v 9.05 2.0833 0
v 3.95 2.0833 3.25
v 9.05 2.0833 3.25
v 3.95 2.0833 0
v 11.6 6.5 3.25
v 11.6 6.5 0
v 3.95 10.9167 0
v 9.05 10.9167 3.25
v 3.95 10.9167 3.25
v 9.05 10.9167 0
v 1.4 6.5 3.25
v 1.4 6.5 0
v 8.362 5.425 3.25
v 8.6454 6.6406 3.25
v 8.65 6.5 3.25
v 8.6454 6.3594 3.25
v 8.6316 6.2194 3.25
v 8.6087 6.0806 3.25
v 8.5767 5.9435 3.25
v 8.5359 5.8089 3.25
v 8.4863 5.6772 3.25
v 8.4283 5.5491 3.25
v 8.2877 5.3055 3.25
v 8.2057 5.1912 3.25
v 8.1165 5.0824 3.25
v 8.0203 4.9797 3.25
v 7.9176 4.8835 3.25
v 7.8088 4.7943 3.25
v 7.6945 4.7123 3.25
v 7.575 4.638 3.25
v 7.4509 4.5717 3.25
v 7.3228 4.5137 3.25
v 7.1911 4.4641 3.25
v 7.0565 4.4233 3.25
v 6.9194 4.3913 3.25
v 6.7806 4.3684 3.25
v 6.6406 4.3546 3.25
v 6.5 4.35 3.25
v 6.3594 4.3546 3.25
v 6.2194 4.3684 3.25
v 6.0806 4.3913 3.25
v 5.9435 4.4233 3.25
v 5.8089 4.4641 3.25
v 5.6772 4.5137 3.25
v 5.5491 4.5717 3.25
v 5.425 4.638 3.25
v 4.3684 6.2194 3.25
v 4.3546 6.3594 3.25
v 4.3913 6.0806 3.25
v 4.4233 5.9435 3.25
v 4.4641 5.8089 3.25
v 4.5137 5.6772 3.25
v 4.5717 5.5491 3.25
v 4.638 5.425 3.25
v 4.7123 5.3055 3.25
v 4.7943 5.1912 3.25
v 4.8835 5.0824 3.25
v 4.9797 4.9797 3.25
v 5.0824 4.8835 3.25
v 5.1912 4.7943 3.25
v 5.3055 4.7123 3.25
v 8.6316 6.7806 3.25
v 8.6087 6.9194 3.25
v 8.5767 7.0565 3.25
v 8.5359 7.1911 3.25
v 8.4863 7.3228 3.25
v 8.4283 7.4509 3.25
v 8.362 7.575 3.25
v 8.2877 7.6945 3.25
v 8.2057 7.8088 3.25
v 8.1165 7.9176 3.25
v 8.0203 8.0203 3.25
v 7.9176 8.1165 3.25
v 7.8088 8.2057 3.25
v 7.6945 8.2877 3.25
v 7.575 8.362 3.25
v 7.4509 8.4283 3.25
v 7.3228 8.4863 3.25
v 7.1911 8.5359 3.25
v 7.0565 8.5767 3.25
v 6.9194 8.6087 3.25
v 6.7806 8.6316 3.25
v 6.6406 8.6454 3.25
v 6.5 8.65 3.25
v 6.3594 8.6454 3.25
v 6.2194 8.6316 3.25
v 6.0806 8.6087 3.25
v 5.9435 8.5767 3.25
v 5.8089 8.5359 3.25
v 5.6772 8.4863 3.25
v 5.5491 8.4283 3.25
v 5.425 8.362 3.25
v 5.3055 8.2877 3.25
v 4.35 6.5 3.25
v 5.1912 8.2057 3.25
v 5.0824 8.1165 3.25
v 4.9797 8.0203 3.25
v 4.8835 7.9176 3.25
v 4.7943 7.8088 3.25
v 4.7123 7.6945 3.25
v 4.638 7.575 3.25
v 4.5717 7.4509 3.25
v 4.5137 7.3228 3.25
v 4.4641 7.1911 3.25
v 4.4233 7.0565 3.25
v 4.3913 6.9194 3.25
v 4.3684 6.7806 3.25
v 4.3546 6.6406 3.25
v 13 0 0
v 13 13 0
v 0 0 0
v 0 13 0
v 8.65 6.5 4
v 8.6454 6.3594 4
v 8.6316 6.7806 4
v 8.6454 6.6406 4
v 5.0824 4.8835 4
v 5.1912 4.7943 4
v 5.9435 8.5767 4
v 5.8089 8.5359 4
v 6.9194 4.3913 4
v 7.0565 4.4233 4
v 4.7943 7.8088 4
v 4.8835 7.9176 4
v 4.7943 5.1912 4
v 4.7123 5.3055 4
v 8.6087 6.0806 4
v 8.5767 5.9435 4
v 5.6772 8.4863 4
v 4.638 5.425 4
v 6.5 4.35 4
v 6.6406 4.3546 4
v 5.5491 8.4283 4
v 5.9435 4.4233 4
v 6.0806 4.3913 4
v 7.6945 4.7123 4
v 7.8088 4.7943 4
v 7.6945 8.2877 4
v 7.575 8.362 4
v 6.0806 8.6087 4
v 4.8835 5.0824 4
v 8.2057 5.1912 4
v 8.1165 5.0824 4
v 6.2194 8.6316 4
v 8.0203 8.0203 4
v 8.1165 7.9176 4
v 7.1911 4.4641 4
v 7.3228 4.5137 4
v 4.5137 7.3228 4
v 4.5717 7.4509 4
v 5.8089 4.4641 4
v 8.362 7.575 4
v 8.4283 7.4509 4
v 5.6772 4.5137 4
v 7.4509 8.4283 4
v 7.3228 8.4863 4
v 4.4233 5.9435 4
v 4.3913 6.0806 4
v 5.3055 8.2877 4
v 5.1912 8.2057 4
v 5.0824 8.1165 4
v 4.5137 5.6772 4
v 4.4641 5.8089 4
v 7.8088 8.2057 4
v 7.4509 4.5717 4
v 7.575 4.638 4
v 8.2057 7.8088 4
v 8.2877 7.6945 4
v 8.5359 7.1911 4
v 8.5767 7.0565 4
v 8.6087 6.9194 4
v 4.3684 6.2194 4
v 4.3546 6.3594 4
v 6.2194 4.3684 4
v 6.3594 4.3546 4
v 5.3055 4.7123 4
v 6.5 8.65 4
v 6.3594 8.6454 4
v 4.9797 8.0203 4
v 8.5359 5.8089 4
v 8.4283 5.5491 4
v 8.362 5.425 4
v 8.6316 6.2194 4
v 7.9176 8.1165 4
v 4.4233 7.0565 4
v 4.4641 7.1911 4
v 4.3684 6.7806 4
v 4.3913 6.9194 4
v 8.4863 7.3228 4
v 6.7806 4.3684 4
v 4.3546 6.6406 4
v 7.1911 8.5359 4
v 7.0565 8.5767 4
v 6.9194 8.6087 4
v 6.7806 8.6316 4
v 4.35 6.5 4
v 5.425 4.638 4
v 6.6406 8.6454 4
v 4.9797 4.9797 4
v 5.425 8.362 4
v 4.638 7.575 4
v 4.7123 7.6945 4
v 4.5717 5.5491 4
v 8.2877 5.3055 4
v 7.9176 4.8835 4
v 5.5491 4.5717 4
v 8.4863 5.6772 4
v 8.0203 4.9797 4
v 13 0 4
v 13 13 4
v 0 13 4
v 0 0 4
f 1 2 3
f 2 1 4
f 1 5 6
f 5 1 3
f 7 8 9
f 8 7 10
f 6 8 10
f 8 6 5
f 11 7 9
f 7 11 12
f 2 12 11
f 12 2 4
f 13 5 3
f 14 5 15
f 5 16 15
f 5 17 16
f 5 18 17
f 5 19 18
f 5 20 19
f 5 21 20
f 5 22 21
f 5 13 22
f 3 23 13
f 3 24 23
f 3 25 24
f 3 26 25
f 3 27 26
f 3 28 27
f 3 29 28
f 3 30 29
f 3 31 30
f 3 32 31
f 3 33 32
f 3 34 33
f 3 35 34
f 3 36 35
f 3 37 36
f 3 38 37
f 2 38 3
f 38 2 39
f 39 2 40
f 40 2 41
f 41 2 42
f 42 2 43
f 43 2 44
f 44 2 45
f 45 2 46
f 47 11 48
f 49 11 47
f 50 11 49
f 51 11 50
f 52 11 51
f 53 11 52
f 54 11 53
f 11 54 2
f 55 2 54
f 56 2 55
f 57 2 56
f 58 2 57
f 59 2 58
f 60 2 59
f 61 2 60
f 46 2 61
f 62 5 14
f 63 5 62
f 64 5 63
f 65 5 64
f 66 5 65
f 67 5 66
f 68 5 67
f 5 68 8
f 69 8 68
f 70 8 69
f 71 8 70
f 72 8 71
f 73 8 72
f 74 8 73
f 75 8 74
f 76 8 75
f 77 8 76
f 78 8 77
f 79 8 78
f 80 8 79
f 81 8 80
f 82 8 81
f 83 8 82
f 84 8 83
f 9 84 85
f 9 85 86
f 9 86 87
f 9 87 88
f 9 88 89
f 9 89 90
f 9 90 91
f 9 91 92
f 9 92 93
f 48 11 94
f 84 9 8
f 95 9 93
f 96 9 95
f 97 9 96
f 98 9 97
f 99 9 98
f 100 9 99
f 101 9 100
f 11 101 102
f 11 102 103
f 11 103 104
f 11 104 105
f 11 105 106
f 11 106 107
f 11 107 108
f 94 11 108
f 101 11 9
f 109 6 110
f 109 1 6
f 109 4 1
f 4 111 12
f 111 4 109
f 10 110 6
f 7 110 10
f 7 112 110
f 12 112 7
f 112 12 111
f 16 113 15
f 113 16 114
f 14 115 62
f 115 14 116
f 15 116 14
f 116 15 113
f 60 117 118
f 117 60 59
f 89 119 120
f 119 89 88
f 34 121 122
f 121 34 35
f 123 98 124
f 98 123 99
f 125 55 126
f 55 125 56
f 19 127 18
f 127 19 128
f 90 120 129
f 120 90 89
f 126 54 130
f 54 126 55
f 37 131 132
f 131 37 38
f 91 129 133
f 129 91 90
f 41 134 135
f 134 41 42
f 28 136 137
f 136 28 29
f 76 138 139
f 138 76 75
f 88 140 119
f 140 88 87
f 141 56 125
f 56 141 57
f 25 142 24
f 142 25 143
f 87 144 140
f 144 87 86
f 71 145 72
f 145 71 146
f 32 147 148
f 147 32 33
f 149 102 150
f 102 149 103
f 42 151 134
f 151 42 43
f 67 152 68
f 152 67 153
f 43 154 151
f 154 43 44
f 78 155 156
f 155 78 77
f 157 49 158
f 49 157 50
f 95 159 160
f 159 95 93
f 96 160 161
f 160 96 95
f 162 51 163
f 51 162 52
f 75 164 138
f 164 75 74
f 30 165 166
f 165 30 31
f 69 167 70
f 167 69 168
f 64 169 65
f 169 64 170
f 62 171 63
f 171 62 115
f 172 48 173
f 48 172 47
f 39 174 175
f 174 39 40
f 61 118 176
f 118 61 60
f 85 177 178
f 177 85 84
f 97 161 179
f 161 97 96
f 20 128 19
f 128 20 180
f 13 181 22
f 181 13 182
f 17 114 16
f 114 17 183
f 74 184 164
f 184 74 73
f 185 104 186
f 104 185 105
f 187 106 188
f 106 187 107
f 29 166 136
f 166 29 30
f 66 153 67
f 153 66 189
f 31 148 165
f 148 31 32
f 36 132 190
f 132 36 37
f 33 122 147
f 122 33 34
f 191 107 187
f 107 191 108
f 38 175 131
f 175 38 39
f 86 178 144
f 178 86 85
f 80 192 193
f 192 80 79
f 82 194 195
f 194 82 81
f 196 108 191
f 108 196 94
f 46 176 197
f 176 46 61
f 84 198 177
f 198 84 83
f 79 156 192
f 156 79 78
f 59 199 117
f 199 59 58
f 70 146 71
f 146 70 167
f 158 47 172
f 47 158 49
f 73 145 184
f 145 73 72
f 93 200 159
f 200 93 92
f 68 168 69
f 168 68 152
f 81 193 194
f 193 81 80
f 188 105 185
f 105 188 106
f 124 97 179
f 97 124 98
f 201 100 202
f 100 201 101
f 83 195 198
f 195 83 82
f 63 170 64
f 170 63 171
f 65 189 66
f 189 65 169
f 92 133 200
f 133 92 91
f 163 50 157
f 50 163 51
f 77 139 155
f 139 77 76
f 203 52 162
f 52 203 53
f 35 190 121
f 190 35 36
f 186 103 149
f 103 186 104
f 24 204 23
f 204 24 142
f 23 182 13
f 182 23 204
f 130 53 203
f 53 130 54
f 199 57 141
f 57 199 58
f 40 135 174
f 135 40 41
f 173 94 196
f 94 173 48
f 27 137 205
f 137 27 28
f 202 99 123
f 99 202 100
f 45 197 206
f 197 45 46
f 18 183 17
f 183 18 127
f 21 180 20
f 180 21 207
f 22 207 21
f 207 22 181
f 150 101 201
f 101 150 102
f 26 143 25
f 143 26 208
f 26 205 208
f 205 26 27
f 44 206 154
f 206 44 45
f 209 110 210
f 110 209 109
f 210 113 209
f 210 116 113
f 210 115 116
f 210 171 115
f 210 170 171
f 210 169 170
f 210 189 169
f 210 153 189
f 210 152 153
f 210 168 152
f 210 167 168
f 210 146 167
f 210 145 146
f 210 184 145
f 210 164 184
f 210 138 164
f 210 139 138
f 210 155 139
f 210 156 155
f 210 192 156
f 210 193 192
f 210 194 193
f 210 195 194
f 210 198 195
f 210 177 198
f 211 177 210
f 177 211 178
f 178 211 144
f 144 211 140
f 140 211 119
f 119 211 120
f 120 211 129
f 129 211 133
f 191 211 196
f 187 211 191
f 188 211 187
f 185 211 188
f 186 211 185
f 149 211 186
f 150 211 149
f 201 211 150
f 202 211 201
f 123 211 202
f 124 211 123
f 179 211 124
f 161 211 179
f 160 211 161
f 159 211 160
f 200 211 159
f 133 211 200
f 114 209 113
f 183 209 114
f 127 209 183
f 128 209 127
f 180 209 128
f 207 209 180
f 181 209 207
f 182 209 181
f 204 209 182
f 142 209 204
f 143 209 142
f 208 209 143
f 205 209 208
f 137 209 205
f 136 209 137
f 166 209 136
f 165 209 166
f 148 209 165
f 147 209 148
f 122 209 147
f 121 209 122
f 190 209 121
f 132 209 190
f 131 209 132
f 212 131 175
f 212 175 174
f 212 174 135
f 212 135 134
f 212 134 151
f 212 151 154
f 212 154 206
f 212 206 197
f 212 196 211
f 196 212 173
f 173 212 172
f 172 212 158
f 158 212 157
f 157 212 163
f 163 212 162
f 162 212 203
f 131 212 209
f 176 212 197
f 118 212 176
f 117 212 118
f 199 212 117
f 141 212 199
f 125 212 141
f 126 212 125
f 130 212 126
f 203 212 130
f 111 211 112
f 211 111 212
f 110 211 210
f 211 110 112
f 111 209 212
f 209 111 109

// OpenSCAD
$fn = 96;

//bolt holes
bolt_length = 50;
bolt_size = 4.3 ;
nut_size = 10.2;
nut_height = 6.5;

cube_size = 13;

difference(){
  cube ([ cube_size, cube_size, 4 ]);
  
  translate([ cube_size/2, cube_size/2, 0 ]){
  cylinder ( h = nut_height/2, r = nut_size/2, $fn = 6 );
  cylinder ( h = bolt_length/2, r = bolt_size/2 );
  }
}
